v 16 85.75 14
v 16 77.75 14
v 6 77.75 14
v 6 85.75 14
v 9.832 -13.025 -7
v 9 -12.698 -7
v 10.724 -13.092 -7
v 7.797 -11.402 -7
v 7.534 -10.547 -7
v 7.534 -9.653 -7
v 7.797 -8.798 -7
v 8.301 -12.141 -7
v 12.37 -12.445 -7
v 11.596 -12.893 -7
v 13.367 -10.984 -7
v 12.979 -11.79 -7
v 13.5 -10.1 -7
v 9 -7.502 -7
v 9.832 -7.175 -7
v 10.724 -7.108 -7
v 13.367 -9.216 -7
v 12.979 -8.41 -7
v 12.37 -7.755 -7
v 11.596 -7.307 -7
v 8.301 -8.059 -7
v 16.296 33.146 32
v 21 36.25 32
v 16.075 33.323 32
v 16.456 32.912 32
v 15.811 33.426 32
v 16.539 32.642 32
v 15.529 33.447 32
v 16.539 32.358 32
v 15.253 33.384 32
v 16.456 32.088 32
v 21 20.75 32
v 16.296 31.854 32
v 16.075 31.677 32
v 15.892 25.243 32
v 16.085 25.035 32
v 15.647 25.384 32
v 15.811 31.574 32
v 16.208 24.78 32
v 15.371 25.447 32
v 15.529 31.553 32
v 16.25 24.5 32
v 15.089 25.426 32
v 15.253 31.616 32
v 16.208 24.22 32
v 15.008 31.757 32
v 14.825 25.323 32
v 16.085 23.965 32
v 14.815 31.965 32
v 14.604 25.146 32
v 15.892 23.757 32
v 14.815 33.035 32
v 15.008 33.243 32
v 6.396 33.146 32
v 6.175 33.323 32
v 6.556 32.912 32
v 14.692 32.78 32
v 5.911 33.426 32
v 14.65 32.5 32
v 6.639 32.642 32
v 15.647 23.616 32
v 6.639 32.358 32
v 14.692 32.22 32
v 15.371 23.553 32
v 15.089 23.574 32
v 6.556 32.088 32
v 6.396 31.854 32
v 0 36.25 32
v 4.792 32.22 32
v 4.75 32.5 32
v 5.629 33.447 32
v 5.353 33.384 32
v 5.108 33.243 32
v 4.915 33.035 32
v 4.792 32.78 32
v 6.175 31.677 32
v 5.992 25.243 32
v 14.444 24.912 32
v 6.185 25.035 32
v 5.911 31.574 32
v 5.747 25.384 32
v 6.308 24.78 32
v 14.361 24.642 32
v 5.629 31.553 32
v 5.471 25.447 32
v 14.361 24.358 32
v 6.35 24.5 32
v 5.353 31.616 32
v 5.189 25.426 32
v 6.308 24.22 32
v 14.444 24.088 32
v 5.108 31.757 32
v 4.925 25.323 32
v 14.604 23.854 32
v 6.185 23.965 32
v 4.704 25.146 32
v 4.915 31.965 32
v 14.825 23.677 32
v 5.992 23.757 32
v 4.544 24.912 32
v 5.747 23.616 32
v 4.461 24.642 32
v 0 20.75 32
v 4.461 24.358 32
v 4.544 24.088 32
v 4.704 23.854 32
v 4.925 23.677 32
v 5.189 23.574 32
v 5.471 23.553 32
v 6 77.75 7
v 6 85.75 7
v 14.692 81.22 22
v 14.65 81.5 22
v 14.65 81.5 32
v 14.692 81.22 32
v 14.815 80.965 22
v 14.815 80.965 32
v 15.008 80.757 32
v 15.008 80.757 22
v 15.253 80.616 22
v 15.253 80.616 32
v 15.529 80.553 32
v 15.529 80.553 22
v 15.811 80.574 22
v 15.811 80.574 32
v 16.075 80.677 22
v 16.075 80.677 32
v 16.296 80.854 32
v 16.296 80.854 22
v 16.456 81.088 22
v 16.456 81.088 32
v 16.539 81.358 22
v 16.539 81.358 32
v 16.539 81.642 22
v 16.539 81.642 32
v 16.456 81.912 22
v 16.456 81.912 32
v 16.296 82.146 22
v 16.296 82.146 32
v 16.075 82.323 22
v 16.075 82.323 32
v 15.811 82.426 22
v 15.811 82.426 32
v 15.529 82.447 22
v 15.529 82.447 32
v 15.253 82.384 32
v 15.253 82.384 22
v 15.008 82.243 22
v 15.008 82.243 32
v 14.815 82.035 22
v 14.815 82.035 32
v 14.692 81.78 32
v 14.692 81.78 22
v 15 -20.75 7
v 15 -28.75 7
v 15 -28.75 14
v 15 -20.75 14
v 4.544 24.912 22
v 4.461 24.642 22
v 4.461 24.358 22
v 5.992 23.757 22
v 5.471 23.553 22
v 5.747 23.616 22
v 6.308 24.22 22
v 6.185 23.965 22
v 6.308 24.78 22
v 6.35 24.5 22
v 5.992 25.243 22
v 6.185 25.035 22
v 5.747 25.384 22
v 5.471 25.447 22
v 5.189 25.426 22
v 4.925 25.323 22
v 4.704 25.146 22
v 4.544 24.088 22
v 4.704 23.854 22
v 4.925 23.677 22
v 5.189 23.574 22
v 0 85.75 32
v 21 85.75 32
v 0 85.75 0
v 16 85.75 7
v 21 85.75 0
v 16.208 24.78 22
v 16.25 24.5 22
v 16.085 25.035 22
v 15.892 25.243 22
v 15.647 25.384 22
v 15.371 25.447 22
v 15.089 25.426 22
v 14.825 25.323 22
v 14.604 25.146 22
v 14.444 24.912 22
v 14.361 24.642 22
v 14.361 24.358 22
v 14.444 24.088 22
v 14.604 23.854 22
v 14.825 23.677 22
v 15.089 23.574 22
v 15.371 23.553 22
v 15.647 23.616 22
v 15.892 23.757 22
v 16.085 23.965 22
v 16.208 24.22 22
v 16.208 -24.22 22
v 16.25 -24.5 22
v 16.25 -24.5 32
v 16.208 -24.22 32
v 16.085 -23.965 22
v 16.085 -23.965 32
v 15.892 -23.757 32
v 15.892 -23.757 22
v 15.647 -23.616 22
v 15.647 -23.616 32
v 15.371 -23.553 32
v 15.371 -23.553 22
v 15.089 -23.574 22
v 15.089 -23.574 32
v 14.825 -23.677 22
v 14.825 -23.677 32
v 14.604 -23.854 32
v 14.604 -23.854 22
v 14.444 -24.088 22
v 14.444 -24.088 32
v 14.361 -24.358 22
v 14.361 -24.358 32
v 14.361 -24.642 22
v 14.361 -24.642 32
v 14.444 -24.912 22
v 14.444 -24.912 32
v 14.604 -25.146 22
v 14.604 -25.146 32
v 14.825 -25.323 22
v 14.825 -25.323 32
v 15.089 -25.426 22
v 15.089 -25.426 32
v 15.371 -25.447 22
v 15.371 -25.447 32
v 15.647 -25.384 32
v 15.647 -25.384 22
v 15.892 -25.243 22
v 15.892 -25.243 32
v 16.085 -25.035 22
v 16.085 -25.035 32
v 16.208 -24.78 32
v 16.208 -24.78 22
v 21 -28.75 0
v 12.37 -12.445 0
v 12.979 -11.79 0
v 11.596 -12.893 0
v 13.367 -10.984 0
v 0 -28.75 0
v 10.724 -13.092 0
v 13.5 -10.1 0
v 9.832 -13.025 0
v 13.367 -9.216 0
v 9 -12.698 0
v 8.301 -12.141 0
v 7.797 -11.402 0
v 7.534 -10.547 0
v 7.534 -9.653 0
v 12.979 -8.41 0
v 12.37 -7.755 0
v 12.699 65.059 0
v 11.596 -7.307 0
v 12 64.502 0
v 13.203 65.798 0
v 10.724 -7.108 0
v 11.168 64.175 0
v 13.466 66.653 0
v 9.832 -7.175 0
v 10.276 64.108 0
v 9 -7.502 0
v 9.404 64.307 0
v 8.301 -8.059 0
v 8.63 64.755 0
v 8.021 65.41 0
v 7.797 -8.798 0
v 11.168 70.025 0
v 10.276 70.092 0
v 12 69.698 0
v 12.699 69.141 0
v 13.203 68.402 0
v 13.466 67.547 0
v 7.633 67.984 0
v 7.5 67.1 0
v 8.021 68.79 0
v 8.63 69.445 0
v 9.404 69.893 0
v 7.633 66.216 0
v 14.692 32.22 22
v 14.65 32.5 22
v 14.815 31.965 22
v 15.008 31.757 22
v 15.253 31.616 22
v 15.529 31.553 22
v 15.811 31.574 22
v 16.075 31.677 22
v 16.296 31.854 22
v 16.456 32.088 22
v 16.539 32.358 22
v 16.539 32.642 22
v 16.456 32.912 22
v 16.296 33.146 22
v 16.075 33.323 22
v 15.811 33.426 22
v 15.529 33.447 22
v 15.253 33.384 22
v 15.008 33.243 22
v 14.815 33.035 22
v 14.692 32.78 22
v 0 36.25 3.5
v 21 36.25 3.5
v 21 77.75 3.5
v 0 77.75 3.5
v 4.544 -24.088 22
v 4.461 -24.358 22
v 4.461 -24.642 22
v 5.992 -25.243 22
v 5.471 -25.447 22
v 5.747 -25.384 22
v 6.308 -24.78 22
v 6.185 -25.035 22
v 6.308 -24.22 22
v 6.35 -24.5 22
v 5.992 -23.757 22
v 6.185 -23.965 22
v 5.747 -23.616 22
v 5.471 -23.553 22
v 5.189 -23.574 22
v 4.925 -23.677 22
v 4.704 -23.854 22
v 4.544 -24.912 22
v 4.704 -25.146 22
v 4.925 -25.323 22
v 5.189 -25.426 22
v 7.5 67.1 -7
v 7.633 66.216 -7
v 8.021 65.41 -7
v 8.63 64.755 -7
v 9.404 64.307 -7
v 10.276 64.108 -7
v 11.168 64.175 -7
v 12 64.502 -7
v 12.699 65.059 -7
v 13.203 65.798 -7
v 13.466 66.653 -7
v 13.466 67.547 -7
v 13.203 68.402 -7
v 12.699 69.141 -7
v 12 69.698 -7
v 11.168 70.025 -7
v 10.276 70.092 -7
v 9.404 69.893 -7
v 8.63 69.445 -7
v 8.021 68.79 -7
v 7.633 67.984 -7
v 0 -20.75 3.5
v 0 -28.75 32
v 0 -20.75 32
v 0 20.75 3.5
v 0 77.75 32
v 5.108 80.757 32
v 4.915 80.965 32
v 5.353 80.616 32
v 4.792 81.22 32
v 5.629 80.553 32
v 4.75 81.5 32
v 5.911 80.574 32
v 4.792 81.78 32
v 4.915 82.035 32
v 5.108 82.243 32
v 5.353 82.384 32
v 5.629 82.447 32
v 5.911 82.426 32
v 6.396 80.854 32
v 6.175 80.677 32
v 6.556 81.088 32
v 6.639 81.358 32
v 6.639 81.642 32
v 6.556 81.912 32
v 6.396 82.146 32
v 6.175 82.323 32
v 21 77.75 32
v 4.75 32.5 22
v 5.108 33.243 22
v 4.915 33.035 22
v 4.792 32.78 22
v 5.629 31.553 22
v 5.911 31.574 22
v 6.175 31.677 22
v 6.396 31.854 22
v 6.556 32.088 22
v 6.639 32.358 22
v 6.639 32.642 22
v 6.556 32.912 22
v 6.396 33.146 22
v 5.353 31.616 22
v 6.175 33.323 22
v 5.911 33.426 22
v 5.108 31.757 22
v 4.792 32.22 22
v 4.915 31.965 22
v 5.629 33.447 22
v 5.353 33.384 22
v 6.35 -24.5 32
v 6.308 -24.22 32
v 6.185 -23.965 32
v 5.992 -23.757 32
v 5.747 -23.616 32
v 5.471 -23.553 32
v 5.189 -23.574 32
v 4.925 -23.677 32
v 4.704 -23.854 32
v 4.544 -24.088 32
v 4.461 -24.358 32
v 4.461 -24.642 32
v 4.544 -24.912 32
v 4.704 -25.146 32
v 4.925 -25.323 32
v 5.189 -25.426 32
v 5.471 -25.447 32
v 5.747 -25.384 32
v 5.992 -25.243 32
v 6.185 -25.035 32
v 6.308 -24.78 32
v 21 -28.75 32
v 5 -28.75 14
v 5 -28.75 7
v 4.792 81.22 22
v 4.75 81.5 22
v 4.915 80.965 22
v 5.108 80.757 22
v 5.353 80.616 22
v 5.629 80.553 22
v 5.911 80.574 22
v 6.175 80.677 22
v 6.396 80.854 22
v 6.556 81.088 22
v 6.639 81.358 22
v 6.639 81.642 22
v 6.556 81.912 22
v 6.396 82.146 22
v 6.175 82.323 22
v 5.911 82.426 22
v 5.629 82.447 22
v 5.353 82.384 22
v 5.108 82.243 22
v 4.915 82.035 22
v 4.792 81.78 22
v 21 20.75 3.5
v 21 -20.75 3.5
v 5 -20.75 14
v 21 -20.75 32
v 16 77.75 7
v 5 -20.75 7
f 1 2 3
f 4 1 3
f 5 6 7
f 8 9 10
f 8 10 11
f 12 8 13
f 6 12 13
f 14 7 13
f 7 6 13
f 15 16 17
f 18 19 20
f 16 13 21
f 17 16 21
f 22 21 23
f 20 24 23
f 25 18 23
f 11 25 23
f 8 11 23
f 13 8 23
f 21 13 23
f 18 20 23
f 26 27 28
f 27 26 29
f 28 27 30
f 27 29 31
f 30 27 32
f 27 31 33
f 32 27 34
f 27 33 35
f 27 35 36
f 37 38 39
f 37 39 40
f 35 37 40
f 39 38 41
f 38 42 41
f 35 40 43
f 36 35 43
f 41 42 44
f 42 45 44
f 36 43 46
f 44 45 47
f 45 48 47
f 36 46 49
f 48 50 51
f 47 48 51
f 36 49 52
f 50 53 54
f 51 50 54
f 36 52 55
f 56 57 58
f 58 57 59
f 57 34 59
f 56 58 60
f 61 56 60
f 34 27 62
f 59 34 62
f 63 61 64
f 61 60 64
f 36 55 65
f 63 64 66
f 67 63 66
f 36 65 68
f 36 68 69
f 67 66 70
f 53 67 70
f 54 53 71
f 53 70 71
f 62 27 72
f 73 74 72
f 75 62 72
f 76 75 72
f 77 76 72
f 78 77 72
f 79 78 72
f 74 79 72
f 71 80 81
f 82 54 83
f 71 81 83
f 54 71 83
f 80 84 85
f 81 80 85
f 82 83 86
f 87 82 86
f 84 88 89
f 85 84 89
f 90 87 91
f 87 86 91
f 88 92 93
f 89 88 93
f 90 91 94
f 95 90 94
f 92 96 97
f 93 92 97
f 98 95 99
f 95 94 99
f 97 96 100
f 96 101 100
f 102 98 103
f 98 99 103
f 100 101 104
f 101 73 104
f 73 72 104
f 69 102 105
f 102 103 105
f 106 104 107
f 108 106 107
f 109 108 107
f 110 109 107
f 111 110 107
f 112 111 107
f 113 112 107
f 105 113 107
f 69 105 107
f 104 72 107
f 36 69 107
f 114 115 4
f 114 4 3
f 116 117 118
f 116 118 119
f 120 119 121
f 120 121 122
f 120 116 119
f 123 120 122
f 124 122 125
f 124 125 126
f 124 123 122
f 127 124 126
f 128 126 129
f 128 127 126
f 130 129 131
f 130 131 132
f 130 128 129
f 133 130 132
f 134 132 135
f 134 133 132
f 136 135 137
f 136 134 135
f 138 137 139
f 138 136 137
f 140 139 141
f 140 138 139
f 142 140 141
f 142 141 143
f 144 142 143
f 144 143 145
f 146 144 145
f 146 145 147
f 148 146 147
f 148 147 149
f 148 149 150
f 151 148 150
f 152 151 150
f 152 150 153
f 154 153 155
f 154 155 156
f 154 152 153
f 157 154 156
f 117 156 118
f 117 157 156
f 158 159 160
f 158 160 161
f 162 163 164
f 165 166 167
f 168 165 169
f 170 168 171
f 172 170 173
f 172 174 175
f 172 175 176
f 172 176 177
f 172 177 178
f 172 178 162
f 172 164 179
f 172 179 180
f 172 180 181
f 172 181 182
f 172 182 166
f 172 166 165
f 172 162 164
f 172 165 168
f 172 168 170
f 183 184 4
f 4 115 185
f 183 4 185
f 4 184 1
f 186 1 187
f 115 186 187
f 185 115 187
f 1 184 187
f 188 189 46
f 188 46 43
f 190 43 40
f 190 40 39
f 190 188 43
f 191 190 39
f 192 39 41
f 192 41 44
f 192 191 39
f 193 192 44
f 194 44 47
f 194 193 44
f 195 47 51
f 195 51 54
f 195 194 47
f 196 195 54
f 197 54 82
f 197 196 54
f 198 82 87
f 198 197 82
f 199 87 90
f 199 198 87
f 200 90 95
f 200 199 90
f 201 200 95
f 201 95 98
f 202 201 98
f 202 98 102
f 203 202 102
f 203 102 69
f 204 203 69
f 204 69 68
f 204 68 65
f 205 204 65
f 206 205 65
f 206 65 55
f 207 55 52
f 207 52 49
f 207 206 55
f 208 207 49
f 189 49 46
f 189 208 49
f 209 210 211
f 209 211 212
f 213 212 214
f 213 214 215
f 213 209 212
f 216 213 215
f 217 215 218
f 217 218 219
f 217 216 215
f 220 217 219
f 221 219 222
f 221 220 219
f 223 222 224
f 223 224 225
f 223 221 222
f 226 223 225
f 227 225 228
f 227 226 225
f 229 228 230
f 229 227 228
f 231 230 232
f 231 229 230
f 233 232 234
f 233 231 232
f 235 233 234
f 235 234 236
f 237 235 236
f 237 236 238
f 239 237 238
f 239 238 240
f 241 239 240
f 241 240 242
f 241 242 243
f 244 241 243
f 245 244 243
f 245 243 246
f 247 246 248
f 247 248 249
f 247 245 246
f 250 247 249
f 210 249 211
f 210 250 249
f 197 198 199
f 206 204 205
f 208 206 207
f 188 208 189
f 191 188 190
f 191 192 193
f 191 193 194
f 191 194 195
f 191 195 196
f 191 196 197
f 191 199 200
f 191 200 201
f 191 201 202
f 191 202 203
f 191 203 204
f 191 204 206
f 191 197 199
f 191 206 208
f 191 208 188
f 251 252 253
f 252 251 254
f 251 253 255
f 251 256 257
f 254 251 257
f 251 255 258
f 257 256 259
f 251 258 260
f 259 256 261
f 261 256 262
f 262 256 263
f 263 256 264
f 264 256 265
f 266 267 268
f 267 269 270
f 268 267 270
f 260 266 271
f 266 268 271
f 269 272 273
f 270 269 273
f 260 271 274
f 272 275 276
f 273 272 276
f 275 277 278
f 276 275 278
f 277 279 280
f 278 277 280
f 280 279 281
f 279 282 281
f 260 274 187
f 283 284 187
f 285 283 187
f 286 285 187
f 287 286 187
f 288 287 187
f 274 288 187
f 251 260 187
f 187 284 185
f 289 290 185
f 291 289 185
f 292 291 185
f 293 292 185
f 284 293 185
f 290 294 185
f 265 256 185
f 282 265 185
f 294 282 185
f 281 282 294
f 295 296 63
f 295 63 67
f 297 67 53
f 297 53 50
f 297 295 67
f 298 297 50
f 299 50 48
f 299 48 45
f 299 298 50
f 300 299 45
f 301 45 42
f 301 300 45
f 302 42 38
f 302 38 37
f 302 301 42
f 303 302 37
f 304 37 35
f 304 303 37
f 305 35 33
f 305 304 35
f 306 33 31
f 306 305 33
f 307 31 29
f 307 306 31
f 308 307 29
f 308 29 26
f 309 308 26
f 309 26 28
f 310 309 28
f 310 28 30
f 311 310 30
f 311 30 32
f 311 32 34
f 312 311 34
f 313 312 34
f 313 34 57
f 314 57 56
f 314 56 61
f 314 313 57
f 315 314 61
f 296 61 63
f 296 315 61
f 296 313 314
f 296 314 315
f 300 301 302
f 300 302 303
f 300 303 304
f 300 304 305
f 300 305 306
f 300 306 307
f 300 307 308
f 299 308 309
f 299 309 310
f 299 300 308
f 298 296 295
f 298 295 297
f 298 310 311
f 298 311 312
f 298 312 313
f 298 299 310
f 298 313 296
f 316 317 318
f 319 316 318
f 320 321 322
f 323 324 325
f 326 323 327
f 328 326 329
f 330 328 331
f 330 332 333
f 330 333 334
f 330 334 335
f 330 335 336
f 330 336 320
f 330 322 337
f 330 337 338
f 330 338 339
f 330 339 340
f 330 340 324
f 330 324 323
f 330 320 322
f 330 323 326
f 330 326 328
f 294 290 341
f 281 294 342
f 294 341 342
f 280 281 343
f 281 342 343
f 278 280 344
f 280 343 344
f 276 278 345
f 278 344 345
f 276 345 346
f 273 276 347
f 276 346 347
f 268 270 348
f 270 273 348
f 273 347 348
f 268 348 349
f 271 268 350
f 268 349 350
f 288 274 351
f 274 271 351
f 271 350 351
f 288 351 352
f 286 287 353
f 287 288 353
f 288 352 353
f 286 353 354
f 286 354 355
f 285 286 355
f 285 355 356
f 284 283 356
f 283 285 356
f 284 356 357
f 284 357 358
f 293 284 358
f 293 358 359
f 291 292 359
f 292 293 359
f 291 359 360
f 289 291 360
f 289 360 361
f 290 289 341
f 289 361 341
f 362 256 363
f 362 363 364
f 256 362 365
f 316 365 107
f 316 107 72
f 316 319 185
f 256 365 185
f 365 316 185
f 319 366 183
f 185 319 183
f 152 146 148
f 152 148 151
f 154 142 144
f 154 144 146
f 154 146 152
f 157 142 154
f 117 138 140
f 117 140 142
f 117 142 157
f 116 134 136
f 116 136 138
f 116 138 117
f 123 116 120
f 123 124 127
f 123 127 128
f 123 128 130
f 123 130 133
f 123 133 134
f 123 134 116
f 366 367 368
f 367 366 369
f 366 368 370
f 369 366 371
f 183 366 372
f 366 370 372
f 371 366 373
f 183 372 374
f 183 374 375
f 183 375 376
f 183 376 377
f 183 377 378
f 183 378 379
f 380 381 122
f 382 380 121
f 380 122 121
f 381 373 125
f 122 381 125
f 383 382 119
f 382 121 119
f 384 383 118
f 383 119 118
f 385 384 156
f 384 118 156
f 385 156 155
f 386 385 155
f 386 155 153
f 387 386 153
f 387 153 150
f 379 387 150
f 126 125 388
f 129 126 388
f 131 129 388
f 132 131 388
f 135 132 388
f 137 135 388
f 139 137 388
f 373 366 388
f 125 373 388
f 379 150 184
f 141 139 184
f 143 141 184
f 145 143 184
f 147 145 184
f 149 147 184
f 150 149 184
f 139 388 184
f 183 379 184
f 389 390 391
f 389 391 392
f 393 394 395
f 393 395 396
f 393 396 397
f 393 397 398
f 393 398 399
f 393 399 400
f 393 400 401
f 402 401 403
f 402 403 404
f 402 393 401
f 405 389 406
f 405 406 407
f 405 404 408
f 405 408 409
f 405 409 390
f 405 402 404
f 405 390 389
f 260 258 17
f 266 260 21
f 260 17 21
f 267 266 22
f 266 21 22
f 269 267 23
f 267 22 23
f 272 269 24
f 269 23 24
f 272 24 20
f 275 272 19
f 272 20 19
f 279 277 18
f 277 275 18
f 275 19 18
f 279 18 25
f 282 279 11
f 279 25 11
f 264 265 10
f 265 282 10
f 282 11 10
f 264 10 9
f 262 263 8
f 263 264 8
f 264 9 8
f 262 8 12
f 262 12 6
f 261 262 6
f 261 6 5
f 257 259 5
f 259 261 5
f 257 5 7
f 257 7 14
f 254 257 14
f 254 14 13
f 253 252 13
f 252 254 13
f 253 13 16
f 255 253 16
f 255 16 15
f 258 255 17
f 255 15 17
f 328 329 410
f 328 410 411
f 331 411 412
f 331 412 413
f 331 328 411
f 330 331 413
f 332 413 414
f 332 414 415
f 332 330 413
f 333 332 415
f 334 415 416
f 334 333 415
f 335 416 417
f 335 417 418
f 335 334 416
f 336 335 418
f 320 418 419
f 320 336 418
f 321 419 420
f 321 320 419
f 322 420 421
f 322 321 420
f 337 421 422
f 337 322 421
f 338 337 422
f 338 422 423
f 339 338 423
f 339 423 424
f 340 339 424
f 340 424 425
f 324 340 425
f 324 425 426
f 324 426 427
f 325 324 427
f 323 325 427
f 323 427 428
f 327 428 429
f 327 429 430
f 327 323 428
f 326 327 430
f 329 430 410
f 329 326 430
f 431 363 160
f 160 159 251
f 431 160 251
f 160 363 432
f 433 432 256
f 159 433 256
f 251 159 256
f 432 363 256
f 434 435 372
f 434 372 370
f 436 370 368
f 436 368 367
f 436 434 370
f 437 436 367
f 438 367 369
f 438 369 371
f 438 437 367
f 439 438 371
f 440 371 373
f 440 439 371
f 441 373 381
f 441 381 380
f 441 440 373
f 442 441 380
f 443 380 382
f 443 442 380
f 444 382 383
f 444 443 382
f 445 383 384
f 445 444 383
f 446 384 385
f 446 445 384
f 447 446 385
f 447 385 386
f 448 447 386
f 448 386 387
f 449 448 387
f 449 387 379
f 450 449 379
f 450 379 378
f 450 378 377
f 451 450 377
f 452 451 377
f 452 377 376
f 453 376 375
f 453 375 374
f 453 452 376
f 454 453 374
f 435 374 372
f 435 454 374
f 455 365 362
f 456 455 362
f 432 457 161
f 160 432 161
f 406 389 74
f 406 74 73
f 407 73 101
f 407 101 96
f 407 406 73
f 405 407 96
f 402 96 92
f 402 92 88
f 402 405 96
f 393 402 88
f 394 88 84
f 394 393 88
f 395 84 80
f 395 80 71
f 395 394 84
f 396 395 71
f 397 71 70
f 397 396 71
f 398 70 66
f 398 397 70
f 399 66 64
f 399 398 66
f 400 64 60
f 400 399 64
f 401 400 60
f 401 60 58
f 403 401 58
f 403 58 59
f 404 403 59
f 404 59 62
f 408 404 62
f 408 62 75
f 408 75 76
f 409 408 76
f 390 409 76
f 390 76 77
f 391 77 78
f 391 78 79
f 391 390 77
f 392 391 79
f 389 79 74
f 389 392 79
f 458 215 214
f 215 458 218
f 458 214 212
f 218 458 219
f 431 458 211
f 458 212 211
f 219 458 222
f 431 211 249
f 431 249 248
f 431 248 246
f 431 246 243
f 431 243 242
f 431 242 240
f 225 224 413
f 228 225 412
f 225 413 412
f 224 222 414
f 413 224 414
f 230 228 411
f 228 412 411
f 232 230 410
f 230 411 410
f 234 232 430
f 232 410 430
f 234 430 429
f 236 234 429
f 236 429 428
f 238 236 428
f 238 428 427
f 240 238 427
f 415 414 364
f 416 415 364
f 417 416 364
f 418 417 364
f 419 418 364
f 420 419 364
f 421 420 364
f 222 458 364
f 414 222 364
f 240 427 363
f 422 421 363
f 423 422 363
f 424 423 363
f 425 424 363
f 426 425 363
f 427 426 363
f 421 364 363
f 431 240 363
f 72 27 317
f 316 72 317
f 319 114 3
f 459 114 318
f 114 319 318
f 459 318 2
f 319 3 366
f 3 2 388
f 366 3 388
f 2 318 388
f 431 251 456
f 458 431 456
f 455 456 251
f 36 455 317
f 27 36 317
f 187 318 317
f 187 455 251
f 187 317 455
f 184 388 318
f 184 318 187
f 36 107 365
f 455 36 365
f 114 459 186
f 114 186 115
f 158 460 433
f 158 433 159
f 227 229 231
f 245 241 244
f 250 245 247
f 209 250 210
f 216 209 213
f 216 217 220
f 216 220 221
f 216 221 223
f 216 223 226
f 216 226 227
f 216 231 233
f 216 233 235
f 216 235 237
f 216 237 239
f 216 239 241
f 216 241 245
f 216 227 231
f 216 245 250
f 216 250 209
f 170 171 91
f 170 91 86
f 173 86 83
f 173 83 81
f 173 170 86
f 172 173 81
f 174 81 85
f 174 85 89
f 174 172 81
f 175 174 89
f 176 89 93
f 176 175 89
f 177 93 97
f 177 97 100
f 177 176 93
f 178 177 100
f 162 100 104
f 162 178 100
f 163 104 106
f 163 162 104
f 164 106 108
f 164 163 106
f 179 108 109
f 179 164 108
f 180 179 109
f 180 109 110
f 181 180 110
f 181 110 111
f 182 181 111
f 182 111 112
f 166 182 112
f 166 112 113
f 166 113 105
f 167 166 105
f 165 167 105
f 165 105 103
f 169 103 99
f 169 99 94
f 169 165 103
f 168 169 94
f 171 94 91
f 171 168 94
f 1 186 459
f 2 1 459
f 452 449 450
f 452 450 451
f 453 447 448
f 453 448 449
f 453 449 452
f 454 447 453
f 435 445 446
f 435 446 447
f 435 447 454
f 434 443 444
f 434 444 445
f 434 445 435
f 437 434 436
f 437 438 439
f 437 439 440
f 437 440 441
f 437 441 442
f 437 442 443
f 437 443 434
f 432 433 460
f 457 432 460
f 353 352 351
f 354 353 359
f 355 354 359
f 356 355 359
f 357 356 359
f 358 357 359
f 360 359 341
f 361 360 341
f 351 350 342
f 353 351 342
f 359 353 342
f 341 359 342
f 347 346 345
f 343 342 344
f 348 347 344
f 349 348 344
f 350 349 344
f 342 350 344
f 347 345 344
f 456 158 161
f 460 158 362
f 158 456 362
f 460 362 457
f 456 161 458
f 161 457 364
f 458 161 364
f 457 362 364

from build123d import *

# Parameters (mm, degrees)
CYLINDER022_R             = 0.95
CYLINDER022_DEPTH         = 10
CYLINDER023_R             = 0.95
CYLINDER023_DEPTH         = 10
CYLINDER020_R             = 0.95
CYLINDER020_DEPTH         = 10
CYLINDER021_R             = 0.95
CYLINDER021_DEPTH         = 10
BOX004_W                  = 10
BOX004_H                  = 10
BOX004_DEPTH              = 7
PAD007_DEPTH              = 21
CYLINDER019_R             = 3
CYLINDER019_DEPTH         = 10
CYLINDER027_R             = 0.95
CYLINDER027_DEPTH         = 10
CYLINDER028_R             = 0.95
CYLINDER028_DEPTH         = 10
CYLINDER025_R             = 0.95
CYLINDER025_DEPTH         = 10
CYLINDER026_R             = 0.95
CYLINDER026_DEPTH         = 10
BOX005_W                  = 10
BOX005_H                  = 10
BOX005_DEPTH              = 7
PAD008_DEPTH              = 21
CYLINDER024_R             = 3
CYLINDER024_DEPTH         = 10
FUSION022_PLACEMENT_ANGLE = 180


with BuildPart() as cylinder022:
    # Cylinder022 → Cylinder022 (new body)
    with BuildSketch(Plane(origin=(9.9, 0, 0), x_dir=(1, 0, 0), z_dir=(0, 0, 1))):
        Circle(CYLINDER022_R)
    extrude(amount=CYLINDER022_DEPTH)


with BuildPart() as tornillos009:
    # Cylinder023 → Cylinder023 (new body)
    with BuildSketch(Plane.XY):
        Circle(CYLINDER023_R)
    extrude(amount=CYLINDER023_DEPTH)

    # Fusion016: union Cylinder022
    add(cylinder022.part)


with BuildPart() as tornillos009_1:
    # Fusion016 placement: moved
    add(tornillos009.part.moved(Location((5, -24.5, 22))))


with BuildPart() as cylinder020:
    # Cylinder020 → Cylinder020 (new body)
    with BuildSketch(Plane(origin=(9.9, 0, 0), x_dir=(1, 0, 0), z_dir=(0, 0, 1))):
        Circle(CYLINDER020_R)
    extrude(amount=CYLINDER020_DEPTH)


with BuildPart() as fusion017:
    # Cylinder021 → Cylinder021 (new body)
    with BuildSketch(Plane.XY):
        Circle(CYLINDER021_R)
    extrude(amount=CYLINDER021_DEPTH)

    # Fusion015: union Cylinder020
    add(cylinder020.part)


with BuildPart() as fusion017_1:
    # Fusion015 placement: moved
    add(fusion017.part.moved(Location((5, 24.5, 22))))

    # Fusion017: union Tornillos009
    add(tornillos009_1.part)


with BuildPart() as fusion017_2:
    # Fusion017 placement: moved
    add(fusion017_1.part.moved(Location((0.4, 0, 0))))


with BuildPart() as cube004:
    # Box004 → Box004 (new body)
    with BuildSketch(Plane(origin=(5, -29, 7), x_dir=(1, 0, 0), z_dir=(0, 0, 1))):
        with Locations((5, 5)):
            Rectangle(BOX004_W, BOX004_H)
    extrude(amount=BOX004_DEPTH)


with BuildPart() as holder005:
    # Sketch007 → Pad007 (new body)
    with BuildSketch(Plane.YZ):
        Polygon((-28.75, 32), (-28.75, 0), (28.75, 0), (28.75, 32), (20.75, 32), (20.75, 3.5), (-20.75, 3.5), (-20.75, 32), align=None)
    extrude(amount=PAD007_DEPTH)

    # Cut010: cut Cube004
    add(cube004.part, mode=Mode.SUBTRACT)

    # Cut011: cut Fusion017
    add(fusion017_2.part, mode=Mode.SUBTRACT)


with BuildPart() as holderceje001:
    # Cylinder019 → Cylinder019 (new body)
    with BuildSketch(Plane(origin=(10.5, -10.1, -7), x_dir=(1, 0, 0), z_dir=(0, 0, 1))):
        Circle(CYLINDER019_R)
    extrude(amount=CYLINDER019_DEPTH)

    # Fusion018: union Holder005
    add(holder005.part)


with BuildPart() as cylinder027:
    # Cylinder027 → Cylinder027 (new body)
    with BuildSketch(Plane(origin=(9.9, 0, 0), x_dir=(1, 0, 0), z_dir=(0, 0, 1))):
        Circle(CYLINDER027_R)
    extrude(amount=CYLINDER027_DEPTH)


with BuildPart() as tornillos011:
    # Cylinder028 → Cylinder028 (new body)
    with BuildSketch(Plane.XY):
        Circle(CYLINDER028_R)
    extrude(amount=CYLINDER028_DEPTH)

    # Fusion020: union Cylinder027
    add(cylinder027.part)


with BuildPart() as tornillos011_1:
    # Fusion020 placement: moved
    add(tornillos011.part.moved(Location((5, -24.5, 22))))


with BuildPart() as cylinder025:
    # Cylinder025 → Cylinder025 (new body)
    with BuildSketch(Plane(origin=(9.9, 0, 0), x_dir=(1, 0, 0), z_dir=(0, 0, 1))):
        Circle(CYLINDER025_R)
    extrude(amount=CYLINDER025_DEPTH)


with BuildPart() as fusion021:
    # Cylinder026 → Cylinder026 (new body)
    with BuildSketch(Plane.XY):
        Circle(CYLINDER026_R)
    extrude(amount=CYLINDER026_DEPTH)

    # Fusion019: union Cylinder025
    add(cylinder025.part)


with BuildPart() as fusion021_1:
    # Fusion019 placement: moved
    add(fusion021.part.moved(Location((5, 24.5, 22))))

    # Fusion021: union Tornillos011
    add(tornillos011_1.part)


with BuildPart() as fusion021_2:
    # Fusion021 placement: moved
    add(fusion021_1.part.moved(Location((0.4, 0, 0))))


with BuildPart() as cube005:
    # Box005 → Box005 (new body)
    with BuildSketch(Plane(origin=(5, -29, 7), x_dir=(1, 0, 0), z_dir=(0, 0, 1))):
        with Locations((5, 5)):
            Rectangle(BOX005_W, BOX005_H)
    extrude(amount=BOX005_DEPTH)


with BuildPart() as holder006:
    # Sketch008 → Pad008 (new body)
    with BuildSketch(Plane.YZ):
        Polygon((-28.75, 32), (-28.75, 0), (28.75, 0), (28.75, 32), (20.75, 32), (20.75, 3.5), (-20.75, 3.5), (-20.75, 32), align=None)
    extrude(amount=PAD008_DEPTH)

    # Cut012: cut Cube005
    add(cube005.part, mode=Mode.SUBTRACT)

    # Cut013: cut Fusion021
    add(fusion021_2.part, mode=Mode.SUBTRACT)


with BuildPart() as fusion023:
    # Cylinder024 → Cylinder024 (new body)
    with BuildSketch(Plane(origin=(10.5, -10.1, -7), x_dir=(1, 0, 0), z_dir=(0, 0, 1))):
        Circle(CYLINDER024_R)
    extrude(amount=CYLINDER024_DEPTH)

    # Fusion022: union Holder006
    add(holder006.part)


with BuildPart() as fusion023_1:
    # Fusion022 placement: moved
    add(fusion023.part.moved(Location((21, 57, 0))).rotate(Axis((21, 57, 0), (0, 0, 1)), FUSION022_PLACEMENT_ANGLE))

    # Fusion023: union HolderCEje001
    add(holderceje001.part)


solid = fusion023_1.part
